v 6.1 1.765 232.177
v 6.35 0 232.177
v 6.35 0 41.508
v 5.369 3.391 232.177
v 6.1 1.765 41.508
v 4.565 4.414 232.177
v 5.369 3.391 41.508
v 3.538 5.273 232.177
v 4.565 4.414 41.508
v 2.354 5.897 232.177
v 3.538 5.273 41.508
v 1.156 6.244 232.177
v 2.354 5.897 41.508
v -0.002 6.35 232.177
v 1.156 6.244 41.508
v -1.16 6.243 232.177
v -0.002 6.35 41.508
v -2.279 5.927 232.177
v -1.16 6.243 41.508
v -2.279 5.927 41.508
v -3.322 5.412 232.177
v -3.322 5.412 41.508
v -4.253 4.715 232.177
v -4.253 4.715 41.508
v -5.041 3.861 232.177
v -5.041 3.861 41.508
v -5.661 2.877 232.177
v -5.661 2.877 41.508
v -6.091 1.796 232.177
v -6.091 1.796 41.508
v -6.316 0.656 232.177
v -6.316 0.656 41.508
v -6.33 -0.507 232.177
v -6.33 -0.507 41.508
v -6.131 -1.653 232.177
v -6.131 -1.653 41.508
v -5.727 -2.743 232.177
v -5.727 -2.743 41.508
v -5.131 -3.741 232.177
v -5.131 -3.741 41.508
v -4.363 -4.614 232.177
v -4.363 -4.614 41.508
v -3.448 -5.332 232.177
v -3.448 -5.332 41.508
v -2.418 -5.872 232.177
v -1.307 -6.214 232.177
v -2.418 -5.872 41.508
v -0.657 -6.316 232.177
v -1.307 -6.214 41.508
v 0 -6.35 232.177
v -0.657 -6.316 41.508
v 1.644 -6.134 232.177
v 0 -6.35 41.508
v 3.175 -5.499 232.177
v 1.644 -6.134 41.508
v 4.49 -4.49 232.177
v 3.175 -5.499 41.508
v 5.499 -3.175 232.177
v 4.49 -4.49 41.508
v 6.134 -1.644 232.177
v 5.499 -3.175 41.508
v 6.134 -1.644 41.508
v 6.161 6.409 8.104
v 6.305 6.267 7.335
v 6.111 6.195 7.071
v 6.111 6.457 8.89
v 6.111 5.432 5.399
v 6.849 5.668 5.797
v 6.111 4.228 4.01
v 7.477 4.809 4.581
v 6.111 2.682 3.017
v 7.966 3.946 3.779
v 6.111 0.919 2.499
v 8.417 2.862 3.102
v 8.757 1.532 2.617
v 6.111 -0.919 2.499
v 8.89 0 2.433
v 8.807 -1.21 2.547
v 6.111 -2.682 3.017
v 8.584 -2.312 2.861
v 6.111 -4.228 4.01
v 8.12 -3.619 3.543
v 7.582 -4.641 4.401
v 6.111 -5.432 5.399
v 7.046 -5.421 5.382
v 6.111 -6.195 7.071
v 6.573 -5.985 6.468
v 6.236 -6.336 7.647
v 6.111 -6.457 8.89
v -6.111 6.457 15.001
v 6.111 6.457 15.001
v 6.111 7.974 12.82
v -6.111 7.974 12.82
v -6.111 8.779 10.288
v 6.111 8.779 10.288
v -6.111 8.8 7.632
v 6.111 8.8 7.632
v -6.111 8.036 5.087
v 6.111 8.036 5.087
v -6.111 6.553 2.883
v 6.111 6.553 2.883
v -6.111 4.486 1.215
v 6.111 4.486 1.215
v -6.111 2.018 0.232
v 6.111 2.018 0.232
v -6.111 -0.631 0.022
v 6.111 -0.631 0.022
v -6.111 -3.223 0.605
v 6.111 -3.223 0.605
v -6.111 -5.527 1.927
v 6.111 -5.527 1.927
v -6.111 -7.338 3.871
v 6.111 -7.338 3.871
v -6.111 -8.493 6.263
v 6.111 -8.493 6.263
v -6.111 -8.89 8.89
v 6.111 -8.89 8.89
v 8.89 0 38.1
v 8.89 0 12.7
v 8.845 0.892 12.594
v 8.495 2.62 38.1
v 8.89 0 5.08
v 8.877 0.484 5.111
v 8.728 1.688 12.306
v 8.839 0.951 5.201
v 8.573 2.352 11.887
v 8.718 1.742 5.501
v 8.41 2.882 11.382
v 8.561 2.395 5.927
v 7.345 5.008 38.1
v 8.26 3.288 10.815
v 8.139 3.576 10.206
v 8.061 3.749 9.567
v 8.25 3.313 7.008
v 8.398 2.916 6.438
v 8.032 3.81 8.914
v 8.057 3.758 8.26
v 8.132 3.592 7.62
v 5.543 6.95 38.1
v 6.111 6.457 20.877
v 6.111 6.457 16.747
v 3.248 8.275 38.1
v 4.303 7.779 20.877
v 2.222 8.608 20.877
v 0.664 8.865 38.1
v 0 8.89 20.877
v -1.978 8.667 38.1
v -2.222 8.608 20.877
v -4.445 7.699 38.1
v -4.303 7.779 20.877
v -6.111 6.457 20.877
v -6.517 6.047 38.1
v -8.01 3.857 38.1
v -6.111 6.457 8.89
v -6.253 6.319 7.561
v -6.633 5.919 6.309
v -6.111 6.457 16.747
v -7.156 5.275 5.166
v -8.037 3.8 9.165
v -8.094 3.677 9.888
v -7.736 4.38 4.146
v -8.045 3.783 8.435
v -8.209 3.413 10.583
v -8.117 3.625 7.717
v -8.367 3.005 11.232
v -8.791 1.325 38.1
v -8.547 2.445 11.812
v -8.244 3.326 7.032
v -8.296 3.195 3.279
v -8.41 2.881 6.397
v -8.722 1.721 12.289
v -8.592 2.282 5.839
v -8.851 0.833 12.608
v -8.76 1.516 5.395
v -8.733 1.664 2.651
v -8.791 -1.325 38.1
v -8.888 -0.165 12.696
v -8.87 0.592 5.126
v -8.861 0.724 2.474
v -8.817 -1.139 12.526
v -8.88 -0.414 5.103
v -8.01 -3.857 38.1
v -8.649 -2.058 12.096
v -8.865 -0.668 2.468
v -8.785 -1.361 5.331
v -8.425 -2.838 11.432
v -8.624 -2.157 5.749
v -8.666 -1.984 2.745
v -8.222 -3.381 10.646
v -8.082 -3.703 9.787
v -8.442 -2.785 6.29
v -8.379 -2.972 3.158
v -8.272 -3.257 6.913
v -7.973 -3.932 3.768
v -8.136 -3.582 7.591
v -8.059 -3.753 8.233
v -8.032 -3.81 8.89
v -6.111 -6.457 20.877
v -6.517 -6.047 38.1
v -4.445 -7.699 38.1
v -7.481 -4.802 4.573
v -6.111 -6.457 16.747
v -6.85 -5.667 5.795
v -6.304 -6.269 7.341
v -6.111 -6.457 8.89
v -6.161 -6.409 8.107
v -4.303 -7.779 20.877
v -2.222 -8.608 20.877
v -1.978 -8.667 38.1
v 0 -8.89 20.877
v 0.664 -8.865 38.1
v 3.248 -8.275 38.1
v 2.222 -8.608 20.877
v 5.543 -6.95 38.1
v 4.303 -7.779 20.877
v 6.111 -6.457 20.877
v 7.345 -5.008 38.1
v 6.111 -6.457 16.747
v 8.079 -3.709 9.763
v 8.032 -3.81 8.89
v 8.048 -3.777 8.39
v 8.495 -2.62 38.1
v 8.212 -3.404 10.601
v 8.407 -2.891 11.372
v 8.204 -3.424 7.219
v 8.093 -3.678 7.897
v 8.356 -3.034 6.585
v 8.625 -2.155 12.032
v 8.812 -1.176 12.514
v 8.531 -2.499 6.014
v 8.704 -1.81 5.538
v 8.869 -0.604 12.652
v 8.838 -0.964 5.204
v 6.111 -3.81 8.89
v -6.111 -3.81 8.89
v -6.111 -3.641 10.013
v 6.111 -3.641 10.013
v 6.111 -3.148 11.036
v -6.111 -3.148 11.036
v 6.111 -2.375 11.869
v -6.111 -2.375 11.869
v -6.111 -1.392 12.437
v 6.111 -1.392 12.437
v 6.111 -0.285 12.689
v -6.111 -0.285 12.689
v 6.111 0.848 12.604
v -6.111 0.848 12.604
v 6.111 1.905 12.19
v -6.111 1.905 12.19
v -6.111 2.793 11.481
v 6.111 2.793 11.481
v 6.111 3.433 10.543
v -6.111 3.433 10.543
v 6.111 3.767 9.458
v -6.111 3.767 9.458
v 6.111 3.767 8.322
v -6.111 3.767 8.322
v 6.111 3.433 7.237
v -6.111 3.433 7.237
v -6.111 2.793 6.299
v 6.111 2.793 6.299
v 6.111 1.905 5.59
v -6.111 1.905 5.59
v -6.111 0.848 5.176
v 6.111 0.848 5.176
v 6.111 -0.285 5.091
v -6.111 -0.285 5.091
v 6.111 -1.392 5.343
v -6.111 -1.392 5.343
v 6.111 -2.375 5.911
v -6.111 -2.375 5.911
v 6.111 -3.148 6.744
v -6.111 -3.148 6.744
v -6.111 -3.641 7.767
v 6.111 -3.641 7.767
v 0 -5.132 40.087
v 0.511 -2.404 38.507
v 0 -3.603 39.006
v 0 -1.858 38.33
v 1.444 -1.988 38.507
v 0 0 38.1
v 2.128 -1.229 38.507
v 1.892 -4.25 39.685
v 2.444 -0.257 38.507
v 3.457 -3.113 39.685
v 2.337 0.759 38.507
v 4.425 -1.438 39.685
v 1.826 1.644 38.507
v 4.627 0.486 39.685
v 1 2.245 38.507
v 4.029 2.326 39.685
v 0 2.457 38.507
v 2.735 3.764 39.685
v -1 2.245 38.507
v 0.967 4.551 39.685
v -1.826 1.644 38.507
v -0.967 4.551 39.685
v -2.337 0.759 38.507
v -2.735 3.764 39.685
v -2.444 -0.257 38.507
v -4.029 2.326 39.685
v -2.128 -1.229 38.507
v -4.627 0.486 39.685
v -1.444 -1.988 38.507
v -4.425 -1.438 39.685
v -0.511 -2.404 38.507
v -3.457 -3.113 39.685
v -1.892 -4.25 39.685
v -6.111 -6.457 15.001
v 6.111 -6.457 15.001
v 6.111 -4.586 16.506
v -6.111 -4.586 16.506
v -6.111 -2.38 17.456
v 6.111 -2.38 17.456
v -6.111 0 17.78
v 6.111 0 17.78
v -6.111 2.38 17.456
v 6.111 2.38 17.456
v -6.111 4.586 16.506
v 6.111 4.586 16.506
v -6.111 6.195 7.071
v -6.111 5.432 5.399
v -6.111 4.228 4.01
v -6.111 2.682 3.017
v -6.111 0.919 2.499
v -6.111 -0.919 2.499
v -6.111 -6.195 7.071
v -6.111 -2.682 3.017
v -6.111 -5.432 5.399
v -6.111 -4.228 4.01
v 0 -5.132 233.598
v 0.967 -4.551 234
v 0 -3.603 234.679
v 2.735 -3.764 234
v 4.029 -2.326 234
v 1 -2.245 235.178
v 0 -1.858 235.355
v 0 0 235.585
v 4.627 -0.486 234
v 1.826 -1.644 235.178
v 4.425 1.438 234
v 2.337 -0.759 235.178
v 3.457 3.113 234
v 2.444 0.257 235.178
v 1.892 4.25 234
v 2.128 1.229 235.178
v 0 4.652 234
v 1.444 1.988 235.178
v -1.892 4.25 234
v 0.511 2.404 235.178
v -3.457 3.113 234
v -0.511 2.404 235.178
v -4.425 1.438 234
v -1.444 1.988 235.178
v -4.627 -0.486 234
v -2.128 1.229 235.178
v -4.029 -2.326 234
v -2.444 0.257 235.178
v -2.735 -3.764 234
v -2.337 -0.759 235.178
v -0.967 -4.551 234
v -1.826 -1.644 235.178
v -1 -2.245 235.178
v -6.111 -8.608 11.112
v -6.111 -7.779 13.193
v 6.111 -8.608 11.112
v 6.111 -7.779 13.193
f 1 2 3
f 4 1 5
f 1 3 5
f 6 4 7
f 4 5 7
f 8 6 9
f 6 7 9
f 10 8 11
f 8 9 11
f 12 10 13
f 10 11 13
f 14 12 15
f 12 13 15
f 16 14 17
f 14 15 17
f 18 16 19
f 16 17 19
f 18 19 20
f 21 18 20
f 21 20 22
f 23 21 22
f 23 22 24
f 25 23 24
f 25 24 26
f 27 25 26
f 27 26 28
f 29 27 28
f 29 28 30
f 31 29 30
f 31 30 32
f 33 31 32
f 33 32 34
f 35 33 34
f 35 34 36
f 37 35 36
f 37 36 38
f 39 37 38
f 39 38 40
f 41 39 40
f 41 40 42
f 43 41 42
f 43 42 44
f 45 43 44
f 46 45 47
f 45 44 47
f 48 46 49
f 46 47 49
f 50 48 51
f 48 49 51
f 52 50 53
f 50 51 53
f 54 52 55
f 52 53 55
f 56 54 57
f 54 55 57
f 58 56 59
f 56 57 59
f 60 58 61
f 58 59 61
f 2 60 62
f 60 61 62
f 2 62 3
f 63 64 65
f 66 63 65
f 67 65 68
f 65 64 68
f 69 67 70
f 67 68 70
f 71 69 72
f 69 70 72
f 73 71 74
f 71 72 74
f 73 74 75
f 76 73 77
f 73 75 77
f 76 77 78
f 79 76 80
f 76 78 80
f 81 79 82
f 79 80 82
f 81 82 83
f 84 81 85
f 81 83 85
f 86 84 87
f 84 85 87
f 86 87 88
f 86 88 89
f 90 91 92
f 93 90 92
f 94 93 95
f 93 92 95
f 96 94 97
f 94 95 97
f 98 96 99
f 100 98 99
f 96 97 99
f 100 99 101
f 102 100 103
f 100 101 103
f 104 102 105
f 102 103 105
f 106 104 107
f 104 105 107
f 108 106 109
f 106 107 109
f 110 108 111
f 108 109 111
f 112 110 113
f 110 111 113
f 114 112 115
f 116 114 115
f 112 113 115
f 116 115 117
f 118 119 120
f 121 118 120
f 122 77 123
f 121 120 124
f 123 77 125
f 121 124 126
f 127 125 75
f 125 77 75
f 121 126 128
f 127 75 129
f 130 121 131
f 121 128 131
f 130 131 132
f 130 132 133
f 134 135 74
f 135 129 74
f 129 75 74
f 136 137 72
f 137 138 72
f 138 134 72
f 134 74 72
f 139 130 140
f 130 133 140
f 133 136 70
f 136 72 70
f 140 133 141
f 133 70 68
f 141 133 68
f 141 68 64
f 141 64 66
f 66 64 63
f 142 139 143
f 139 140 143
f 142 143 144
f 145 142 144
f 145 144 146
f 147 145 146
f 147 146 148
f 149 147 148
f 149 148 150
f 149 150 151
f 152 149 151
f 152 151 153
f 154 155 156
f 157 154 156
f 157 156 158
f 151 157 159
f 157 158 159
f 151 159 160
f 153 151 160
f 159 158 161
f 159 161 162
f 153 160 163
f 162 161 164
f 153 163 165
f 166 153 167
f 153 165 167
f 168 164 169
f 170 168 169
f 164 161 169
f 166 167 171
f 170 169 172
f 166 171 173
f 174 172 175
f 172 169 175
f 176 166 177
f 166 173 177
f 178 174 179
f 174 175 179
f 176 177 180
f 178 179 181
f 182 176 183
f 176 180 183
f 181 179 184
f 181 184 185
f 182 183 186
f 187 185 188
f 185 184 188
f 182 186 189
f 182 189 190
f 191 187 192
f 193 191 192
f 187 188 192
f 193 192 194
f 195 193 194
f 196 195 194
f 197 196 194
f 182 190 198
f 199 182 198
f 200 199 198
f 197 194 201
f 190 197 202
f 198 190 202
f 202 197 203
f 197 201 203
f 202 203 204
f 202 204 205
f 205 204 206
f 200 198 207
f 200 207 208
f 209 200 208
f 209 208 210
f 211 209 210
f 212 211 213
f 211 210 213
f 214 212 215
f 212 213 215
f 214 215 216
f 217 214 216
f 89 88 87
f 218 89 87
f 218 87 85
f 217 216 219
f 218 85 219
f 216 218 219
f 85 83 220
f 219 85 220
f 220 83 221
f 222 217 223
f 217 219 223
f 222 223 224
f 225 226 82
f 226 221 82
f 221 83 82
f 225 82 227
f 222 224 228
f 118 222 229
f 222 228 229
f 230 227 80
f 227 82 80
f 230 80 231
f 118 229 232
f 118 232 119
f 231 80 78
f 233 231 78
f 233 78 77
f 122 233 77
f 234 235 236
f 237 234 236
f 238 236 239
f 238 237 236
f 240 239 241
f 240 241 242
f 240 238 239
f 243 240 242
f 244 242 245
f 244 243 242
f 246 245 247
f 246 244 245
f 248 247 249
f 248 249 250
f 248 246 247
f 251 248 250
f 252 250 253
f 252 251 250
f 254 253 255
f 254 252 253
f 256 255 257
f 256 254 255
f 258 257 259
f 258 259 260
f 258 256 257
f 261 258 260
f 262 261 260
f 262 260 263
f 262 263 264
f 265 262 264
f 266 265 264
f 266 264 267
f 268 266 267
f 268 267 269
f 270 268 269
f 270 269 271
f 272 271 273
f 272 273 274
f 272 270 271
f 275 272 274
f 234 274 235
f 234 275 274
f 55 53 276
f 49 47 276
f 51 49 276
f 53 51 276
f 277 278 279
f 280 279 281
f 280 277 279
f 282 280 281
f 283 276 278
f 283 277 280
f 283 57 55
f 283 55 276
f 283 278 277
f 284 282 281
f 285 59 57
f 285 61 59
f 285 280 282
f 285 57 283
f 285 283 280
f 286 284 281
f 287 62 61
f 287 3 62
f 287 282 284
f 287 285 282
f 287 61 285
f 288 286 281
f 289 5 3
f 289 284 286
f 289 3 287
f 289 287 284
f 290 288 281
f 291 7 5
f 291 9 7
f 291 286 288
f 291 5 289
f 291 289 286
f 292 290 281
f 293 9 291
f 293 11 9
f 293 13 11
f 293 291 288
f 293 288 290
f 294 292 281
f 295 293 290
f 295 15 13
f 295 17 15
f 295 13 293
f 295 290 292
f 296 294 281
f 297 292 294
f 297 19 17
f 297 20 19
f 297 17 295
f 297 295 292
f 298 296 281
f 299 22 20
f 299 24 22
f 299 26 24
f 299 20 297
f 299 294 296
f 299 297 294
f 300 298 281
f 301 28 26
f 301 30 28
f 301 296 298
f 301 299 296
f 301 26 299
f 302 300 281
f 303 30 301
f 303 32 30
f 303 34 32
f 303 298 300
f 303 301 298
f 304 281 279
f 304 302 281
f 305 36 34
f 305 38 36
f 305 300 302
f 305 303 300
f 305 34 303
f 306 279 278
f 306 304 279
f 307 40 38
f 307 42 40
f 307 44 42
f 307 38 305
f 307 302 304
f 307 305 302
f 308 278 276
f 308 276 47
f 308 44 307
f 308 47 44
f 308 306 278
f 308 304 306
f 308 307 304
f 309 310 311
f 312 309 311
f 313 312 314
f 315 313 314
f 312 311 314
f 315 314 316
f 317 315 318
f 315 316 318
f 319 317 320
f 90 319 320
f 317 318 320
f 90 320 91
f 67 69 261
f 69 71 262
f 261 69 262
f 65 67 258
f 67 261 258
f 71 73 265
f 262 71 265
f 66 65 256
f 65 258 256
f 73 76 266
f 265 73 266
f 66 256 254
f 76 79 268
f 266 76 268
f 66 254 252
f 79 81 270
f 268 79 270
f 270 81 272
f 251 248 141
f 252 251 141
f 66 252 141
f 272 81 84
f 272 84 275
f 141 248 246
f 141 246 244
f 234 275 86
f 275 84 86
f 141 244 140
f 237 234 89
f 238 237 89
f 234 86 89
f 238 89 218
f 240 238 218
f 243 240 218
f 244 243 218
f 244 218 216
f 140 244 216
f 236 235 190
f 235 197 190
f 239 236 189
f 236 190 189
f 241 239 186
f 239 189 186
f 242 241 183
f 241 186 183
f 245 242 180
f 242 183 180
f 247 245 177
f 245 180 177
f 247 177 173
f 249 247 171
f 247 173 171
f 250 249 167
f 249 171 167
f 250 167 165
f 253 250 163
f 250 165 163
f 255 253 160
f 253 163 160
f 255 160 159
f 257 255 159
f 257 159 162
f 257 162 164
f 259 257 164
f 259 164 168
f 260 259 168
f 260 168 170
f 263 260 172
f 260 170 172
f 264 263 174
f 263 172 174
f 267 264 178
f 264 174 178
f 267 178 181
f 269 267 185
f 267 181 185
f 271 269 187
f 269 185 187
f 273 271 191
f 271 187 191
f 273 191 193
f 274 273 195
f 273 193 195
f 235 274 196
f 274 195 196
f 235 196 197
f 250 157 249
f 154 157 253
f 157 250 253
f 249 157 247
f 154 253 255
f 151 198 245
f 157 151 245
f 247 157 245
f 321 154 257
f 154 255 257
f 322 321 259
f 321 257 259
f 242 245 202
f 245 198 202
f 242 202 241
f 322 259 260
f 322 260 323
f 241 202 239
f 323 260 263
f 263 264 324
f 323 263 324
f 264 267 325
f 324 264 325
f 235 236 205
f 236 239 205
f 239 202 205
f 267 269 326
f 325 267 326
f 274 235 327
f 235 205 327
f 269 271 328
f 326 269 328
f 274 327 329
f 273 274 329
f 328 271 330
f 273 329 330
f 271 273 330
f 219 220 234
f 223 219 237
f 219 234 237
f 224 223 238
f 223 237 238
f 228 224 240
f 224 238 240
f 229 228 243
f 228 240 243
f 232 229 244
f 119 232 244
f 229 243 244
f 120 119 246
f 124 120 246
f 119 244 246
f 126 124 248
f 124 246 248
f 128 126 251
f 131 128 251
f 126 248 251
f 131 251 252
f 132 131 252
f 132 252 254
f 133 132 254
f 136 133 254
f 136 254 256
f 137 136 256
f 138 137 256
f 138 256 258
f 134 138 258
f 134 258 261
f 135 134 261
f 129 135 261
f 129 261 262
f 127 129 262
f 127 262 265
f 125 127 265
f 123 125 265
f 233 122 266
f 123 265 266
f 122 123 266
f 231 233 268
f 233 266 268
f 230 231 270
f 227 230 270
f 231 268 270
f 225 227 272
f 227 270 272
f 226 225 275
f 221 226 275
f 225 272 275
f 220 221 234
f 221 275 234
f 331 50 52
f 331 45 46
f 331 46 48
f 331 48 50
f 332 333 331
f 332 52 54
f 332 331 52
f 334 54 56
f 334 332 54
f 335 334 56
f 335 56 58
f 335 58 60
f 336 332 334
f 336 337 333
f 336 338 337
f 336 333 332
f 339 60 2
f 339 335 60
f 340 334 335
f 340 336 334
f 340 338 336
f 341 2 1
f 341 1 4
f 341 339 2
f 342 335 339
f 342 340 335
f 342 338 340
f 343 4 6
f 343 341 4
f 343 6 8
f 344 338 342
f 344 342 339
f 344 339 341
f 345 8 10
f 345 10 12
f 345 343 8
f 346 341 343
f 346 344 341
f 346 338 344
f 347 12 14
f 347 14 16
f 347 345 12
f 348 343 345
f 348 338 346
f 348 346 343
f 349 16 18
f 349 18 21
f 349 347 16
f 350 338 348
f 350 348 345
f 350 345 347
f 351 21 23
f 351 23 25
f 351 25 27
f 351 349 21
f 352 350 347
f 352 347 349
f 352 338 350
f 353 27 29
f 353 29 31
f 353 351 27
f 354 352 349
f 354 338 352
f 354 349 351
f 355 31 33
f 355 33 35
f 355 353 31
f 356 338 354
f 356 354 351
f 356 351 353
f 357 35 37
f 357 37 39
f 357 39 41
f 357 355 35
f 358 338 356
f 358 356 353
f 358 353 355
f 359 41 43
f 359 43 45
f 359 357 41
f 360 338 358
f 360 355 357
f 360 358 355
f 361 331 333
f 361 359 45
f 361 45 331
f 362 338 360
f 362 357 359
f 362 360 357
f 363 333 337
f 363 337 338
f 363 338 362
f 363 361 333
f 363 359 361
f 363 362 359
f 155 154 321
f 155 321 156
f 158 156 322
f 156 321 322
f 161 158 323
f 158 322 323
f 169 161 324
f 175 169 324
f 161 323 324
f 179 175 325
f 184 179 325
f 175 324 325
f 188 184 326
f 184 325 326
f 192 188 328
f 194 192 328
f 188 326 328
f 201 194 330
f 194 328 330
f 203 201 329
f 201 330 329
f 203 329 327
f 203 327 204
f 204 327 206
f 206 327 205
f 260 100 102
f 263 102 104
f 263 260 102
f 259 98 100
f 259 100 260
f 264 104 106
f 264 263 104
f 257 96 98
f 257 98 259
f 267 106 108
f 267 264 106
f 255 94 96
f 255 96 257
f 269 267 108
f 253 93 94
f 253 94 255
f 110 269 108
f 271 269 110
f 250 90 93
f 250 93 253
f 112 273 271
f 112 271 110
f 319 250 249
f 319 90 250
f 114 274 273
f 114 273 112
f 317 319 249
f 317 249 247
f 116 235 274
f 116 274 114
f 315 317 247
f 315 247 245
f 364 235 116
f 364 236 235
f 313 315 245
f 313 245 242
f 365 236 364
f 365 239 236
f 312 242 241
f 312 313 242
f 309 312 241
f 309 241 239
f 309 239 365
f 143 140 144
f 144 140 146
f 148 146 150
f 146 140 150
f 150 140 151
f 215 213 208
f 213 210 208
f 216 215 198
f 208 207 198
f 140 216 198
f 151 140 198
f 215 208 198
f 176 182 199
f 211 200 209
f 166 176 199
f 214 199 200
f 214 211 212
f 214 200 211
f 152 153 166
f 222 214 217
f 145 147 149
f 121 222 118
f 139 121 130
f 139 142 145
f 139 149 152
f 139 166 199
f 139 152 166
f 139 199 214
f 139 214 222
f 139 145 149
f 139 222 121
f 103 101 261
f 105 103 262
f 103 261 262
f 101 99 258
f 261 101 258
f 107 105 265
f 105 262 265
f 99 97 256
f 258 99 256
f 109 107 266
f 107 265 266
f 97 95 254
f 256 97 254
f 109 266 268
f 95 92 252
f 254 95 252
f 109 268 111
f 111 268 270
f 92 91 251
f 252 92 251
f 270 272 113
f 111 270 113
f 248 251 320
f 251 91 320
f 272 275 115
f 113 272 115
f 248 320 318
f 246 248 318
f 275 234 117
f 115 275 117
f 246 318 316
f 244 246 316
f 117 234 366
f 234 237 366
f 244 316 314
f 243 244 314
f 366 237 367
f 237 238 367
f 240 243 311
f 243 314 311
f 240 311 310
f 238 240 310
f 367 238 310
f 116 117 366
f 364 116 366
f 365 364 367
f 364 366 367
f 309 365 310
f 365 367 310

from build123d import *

# Parameters (mm, degrees)
F0_R      = 8.89
F1_DEPTH  = 38.1
F4_DEPTH  = 38.2524
F7_DEPTH  = 48.7934
F8_R      = 3.81
F9_DEPTH  = 56.642
F10_R     = 3.81
F11_DEPTH = 12.2211605602
F12_R     = 6.35
F13_DEPTH = 197.485


with BuildPart() as f1:
    # F0 (on Top) → F1 (new body)
    with BuildSketch(Plane.XY):
        Circle(F0_R)
    extrude(amount=F1_DEPTH)

    # F3 (on offset) → F4 (cut)
    with BuildSketch(Plane.YZ.offset(25.4)):
        with BuildLine():
            ThreePointArc((6.4570046183, 8.89), (0, 2.4329953817), (-6.4570046183, 8.89))
            Line((-6.4570046183, 8.89), (-6.4570046183, 16.746873036))
            Line((-6.4570046183, 16.746873036), (-10.0484732538, 18.0296134204))
            Line((-10.0484732538, 18.0296134204), (-10.0484732538, 27.6839248836))
            Line((-10.0484732538, 27.6839248836), (-15.5845116824, 29.5067671686))
            Line((-15.5845116824, 29.5067671686), (-19.2977078259, -10.0556556135))
            Line((-19.2977078259, -10.0556556135), (0, -10.0556556135))
            Line((0, -10.0556556135), (19.2977078259, -10.0556556135))
            Line((19.2977078259, -10.0556556135), (15.5845116824, 29.5067671686))
            Line((15.5845116824, 29.5067671686), (10.0484732538, 27.6839248836))
            Line((10.0484732538, 27.6839248836), (10.0484732538, 18.0296134204))
            Line((10.0484732538, 18.0296134204), (6.4570046183, 16.746873036))
            Line((6.4570046183, 16.746873036), (6.4570046183, 8.89))
        make_face()
    extrude(amount=-F4_DEPTH, mode=Mode.SUBTRACT)

    # F6 (on offset) → F7 (cut)
    with BuildSketch(Plane.XZ.offset(31.8570046183)):
        Polygon((6.1105802801, -8.4009311883), (6.1105802801, 8.89), (6.1105802801, 16.746873036), (6.1105802801, 20.8768360317), (-6.1105802801, 20.8768360317), (-6.1105802801, 16.746873036), (-6.1105802801, -8.4009311883), align=None)
    extrude(amount=-F7_DEPTH, mode=Mode.SUBTRACT)

    # F8 (on face) → F9 (cut, symmetric)
    with BuildSketch(Plane(origin=(6.1105802801, 0, 0), x_dir=(0, -1, 0), z_dir=(-1, 0, 0))):
        with Locations((0, 8.89)):
            Circle(F8_R)
    extrude(amount=F9_DEPTH, both=True, mode=Mode.SUBTRACT)


with BuildPart() as f11:
    # F10 (on face) → F11 (new body, through all)
    with BuildSketch(Plane(origin=(6.1105802801, 0, 0), x_dir=(0, -1, 0), z_dir=(-1, 0, 0))):
        with BuildLine():
            Line((6.4570046183, 8.89), (6.4570046183, 15.0005802801))
            ThreePointArc((6.4570046183, 15.0005802801), (0, 17.78), (-6.4570046183, 15.0005802801))
            Line((-6.4570046183, 15.0005802801), (-6.4570046183, 8.89))
            ThreePointArc((-6.4570046183, 8.89), (0, 2.4329953817), (6.4570046183, 8.89))
        make_face()
        with Locations((0, 8.89)):
            Circle(F10_R, mode=Mode.SUBTRACT)
        with BuildLine():
            ThreePointArc((-6.4570046183, 15.0005802801), (-3.2885657165, 0.6306153057), (8.89, 8.89))
            ThreePointArc((8.89, 8.89), (8.2593846943, 12.1785657165), (6.4570046183, 15.0005802801))
            Line((6.4570046183, 15.0005802801), (6.4570046183, 8.89))
            ThreePointArc((6.4570046183, 8.89), (0, 2.4329953817), (-6.4570046183, 8.89))
            Line((-6.4570046183, 8.89), (-6.4570046183, 15.0005802801))
        make_face()
    extrude(amount=F11_DEPTH)


with BuildPart() as f13:
    # F12 (on face) → F13 (new body)
    with BuildSketch(Plane.XY.offset(38.1)):
        Circle(F12_R)
    extrude(amount=F13_DEPTH)

    # F14 (on Right) → F15 (revolve, cut)
    with BuildSketch(Plane.YZ):
        with BuildLine():
            Line((0, 36.0566006196), (0, 38.1))
            ThreePointArc((0, 38.1), (-5.3881536726, 40.3318463274), (-7.62, 45.72))
            Line((-7.62, 45.72), (-9.0922005475, 45.72))
            Line((-9.0922005475, 45.72), (-9.0922005475, 36.0566006196))
            Line((-9.0922005475, 36.0566006196), (0, 36.0566006196))
        make_face()
    revolve(axis=Axis((0, 0, 49.53), (0, 0, 1)), mode=Mode.SUBTRACT)

    # F16 (on Right) → F17 (revolve, cut)
    with BuildSketch(Plane.YZ):
        with BuildLine():
            Line((-16.7539454997, 225.7774323225), (-7.604127579, 227.4734272558))
            ThreePointArc((-7.604127579, 227.4734272558), (-5.5592348534, 233.1764592817), (0, 235.585))
            Line((0, 235.585), (0, 245.8123266697))
            Line((0, 245.8123266697), (-18.5541827232, 245.8123266697))
            Line((-18.5541827232, 245.8123266697), (-16.7539454997, 225.7774323225))
        make_face()
    revolve(axis=Axis((0, 0, 236.8886633348), (0, 0, 1)), mode=Mode.SUBTRACT)


solid = Compound([f1.part, f11.part, f13.part])
